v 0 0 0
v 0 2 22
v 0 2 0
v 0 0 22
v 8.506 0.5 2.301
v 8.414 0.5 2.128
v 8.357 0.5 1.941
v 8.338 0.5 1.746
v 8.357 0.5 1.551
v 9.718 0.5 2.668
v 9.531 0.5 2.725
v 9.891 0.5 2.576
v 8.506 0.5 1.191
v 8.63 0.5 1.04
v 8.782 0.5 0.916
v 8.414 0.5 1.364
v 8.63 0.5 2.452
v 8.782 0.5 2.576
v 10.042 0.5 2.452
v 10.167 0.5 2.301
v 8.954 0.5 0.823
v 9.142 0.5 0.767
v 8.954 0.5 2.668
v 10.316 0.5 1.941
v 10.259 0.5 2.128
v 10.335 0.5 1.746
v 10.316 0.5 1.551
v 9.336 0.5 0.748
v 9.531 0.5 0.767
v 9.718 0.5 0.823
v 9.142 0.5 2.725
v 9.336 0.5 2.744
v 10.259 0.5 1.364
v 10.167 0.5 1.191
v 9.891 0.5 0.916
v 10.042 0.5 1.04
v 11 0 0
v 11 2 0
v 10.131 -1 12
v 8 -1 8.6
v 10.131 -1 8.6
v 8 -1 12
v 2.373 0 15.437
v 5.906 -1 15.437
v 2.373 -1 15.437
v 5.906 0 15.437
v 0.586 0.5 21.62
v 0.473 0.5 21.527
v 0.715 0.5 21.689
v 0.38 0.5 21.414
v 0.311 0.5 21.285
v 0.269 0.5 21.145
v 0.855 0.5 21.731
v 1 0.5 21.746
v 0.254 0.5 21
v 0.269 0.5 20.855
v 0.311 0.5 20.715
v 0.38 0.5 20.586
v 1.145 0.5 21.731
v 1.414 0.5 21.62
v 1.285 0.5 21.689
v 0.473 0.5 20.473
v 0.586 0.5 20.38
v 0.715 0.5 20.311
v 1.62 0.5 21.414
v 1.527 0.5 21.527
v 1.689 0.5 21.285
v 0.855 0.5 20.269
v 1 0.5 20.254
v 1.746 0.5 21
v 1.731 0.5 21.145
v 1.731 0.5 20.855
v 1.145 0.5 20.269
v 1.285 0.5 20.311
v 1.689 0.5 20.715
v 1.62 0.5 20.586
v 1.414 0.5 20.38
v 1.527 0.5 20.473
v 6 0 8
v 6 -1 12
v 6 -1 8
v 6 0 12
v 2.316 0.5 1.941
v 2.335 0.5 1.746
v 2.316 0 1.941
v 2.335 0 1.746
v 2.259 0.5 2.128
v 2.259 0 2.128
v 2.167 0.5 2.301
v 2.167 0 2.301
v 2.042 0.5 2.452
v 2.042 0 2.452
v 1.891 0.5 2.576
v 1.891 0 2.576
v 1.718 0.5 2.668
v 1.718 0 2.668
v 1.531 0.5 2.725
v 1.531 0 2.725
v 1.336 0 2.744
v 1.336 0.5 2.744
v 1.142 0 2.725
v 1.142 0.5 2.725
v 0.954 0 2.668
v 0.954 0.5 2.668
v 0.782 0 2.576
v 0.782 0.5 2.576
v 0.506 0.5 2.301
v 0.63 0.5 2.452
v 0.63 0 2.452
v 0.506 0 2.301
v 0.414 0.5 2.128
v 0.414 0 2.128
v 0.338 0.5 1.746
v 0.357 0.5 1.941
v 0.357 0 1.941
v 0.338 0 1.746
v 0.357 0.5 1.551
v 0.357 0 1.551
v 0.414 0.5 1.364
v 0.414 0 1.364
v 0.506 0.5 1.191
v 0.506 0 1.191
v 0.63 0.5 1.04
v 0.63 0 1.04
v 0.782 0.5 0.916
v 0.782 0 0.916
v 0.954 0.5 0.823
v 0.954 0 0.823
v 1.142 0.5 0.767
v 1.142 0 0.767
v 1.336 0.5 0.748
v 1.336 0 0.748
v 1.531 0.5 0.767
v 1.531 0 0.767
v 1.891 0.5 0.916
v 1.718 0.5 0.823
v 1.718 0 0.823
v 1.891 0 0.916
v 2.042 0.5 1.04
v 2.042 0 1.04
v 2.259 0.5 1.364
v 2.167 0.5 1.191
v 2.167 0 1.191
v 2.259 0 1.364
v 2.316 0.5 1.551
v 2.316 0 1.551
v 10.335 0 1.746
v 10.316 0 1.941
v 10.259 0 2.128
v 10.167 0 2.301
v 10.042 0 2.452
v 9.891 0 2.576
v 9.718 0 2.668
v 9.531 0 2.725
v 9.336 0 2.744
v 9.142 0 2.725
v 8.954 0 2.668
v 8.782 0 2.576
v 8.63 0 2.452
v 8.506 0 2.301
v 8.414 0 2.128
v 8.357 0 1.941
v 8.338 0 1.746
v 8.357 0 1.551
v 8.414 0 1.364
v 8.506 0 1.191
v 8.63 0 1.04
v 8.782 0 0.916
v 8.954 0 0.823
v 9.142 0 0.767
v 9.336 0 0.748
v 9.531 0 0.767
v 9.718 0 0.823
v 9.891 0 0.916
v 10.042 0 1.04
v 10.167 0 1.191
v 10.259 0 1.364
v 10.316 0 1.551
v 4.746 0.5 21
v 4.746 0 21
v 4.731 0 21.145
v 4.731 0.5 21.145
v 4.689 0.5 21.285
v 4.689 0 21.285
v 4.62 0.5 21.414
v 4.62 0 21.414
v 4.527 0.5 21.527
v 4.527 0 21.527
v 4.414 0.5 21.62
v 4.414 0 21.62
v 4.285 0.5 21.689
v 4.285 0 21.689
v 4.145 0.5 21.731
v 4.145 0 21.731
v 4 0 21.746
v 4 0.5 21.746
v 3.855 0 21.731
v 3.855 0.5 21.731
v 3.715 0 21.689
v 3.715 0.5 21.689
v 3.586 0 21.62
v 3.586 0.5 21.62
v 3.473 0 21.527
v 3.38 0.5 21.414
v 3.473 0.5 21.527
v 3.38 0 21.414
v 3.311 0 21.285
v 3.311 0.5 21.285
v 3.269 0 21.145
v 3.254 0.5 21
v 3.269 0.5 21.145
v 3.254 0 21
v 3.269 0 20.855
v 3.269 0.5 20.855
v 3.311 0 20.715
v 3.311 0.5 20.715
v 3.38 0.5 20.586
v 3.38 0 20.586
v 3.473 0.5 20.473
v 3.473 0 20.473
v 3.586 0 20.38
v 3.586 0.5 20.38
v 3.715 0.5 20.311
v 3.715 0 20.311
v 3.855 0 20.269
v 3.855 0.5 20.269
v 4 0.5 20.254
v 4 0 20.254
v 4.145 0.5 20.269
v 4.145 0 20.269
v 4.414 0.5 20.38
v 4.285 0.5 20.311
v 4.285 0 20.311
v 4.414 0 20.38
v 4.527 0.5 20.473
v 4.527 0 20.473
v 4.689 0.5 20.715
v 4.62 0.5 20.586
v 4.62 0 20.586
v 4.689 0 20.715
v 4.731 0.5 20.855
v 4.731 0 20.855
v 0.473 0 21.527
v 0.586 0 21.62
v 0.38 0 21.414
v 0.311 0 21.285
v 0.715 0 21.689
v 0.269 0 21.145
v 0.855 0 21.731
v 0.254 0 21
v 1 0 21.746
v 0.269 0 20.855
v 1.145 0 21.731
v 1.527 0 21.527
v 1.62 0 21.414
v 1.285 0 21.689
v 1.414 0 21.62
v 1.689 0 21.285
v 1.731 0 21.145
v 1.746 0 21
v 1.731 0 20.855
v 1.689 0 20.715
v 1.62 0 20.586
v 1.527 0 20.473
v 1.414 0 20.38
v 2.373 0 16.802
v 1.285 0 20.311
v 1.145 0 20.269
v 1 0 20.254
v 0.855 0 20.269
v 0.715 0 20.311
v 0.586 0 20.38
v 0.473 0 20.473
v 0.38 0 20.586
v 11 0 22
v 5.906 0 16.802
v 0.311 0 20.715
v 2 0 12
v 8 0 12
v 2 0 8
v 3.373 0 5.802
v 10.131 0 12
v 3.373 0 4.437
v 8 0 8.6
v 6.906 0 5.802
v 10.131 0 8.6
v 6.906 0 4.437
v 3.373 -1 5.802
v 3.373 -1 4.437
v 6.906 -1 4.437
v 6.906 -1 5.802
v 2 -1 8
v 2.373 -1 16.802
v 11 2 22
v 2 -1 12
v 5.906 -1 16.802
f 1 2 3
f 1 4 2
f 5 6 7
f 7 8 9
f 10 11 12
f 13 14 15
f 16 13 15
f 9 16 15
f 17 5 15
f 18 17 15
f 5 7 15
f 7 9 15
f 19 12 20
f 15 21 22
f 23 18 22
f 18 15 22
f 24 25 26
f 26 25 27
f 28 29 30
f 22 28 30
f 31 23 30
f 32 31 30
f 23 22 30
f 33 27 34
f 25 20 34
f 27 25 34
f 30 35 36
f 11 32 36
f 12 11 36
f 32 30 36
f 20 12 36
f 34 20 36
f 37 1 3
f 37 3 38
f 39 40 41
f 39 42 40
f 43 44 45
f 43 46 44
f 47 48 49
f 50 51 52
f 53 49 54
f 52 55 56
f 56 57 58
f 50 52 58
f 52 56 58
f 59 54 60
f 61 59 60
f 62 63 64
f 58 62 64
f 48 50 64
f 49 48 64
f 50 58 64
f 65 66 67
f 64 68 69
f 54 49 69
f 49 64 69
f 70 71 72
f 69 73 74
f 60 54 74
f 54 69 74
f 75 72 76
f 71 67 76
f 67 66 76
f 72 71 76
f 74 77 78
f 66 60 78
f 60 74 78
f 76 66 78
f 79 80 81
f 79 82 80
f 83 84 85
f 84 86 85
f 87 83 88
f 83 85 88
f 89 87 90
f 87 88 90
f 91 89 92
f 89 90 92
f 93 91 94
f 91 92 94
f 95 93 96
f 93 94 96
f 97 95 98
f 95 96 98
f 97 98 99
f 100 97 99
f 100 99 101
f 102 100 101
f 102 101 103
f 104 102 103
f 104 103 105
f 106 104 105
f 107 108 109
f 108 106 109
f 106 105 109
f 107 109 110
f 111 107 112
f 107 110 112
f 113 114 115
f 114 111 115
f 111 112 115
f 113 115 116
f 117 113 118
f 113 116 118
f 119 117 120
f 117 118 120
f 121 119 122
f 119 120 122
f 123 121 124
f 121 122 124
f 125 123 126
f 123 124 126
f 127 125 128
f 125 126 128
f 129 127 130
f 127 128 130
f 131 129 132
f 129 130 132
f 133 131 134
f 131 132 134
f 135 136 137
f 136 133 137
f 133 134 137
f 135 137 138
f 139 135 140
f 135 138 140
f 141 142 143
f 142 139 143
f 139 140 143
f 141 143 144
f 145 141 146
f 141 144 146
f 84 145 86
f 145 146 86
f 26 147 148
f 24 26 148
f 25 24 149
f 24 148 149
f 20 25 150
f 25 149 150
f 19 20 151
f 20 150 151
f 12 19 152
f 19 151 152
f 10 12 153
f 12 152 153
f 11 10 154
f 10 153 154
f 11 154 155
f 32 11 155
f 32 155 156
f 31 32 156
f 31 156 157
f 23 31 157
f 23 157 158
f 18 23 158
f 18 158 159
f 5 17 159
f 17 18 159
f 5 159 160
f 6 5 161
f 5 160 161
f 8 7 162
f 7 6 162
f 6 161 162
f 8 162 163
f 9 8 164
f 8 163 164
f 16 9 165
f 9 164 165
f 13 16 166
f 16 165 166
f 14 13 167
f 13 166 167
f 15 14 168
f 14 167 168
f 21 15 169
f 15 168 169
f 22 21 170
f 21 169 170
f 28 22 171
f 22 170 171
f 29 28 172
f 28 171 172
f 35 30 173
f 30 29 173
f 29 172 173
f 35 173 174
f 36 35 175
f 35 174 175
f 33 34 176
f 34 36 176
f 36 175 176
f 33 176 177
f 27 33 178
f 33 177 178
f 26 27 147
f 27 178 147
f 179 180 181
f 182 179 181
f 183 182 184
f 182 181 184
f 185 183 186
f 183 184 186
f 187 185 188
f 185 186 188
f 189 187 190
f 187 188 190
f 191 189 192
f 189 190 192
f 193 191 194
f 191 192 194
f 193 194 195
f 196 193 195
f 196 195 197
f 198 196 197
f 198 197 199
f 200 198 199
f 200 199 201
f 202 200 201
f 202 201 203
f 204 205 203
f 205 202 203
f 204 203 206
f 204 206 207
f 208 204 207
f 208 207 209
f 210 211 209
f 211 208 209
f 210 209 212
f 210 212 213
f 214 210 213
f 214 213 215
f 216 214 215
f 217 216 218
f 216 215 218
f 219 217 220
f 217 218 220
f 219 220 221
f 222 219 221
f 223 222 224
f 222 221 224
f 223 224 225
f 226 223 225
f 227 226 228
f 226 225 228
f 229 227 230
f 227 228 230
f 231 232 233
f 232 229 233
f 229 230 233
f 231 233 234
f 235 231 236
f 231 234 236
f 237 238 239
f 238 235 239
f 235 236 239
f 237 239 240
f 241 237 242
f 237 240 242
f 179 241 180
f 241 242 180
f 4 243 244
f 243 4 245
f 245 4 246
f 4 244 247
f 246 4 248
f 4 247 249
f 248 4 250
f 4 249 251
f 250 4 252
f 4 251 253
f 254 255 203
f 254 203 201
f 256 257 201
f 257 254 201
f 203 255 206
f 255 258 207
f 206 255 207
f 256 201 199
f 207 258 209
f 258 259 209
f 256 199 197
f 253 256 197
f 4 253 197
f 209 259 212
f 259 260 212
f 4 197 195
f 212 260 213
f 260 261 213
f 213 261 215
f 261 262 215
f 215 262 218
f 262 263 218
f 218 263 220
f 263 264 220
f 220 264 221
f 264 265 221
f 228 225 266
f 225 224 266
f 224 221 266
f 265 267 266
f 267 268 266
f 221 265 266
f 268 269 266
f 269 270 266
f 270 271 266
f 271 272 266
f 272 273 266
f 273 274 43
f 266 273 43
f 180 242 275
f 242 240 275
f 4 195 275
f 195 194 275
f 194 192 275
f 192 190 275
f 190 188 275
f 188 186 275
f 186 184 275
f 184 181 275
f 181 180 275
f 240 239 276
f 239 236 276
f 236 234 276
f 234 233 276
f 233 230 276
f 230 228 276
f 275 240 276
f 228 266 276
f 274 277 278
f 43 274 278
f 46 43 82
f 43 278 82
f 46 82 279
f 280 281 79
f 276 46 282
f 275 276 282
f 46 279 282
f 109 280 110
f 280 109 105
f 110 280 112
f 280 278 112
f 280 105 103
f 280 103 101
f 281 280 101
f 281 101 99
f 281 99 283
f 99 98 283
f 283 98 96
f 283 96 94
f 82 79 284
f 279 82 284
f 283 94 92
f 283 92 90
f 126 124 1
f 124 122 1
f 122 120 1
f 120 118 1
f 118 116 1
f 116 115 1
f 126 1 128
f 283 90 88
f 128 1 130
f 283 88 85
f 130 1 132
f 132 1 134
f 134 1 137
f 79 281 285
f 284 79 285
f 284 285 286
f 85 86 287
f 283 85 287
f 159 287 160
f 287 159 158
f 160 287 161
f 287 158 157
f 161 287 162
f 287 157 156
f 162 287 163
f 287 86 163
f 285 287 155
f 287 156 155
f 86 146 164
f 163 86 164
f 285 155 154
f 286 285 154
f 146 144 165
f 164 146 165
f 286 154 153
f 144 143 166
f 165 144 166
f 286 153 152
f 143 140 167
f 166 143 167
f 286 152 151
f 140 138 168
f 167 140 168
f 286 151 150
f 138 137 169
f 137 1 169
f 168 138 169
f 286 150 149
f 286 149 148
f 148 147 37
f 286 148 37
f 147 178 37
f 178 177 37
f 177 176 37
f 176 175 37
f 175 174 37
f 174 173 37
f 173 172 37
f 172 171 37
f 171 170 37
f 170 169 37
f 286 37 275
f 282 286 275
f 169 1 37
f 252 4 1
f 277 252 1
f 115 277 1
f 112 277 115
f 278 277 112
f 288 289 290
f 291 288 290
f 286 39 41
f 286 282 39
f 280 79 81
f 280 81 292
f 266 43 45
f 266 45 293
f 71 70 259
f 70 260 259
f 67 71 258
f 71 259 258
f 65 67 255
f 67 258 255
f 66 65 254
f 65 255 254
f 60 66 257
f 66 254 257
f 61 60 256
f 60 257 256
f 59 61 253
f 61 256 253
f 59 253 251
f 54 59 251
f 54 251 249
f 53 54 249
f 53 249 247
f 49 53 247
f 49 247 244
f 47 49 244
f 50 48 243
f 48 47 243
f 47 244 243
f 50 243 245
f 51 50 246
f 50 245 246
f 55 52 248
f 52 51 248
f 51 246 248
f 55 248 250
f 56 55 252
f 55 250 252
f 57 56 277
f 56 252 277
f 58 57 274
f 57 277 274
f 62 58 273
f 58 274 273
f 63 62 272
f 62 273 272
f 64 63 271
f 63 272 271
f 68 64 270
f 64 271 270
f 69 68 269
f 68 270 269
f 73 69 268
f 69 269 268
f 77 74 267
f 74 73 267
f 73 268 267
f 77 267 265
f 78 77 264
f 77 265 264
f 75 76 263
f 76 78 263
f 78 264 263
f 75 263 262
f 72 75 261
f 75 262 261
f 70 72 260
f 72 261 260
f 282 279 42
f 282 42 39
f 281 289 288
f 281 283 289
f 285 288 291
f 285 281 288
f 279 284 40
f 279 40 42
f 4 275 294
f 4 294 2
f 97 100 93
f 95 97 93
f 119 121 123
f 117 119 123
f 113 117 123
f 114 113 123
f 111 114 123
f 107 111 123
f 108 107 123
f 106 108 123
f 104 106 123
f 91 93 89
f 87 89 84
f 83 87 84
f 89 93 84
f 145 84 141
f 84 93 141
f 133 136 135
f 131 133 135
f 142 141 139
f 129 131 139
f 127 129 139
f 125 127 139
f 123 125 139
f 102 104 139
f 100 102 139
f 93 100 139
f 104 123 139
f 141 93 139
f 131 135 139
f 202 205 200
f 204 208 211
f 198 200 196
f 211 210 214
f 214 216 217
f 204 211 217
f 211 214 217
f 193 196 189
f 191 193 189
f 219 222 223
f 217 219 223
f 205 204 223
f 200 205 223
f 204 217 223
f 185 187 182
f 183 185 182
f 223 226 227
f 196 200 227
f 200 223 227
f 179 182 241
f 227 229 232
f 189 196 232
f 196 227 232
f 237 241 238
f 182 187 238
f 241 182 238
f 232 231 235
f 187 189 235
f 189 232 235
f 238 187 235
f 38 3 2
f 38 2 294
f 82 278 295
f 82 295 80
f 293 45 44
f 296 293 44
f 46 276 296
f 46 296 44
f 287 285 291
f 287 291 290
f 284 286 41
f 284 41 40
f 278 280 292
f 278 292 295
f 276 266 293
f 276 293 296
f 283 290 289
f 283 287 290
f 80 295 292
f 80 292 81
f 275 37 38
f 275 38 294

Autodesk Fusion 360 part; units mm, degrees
sketch "Boceto1" plane through (0, 0, 0) normal (0, 1, 0) x (1, 0, 0)
  line L0 (0, 0) -> (11, 0)
  line L1 (11, 0) -> (11, -22)
  line L2 (11, -22) -> (0, -22)
  line L3 (0, -22) -> (0, 0)
  dimension "d1" = 11
  dimension "d2" = 22
extrude "Extruir1" add sketch "Boceto1" along normal blind 2
sketch "Boceto2" plane through (0, 0, 0) normal (0, -1, 0) x (1, 0, 0)
  line L0 (11, 22) -> (0, 22)
  line L1 (0, 22) -> (0, 0)
  line L2 (0, 0) -> (11, 0)
  line L3 (11, 0) -> (11, 22)
  line L4 (8, 12) -> (10.1306, 12)
  line L5 (10.1306, 12) -> (10.1306, 8.6002)
  line L6 (10.1306, 8.6002) -> (8, 8.6002)
  line L7 (8, 8.6002) -> (8, 12)
  line L8 (2, 12) -> (6, 12)
  line L9 (6, 12) -> (6, 8)
  line L10 (6, 8) -> (2, 8)
  line L11 (2, 8) -> (2, 12)
extrude "Extruir2" add sketch "Boceto2" along normal blind 1 contours L4 L5 L6 L7 | L8 L9 L10 L11
sketch "Boceto3" plane through (0, 0, 0) normal (0, 1, 0) x (1, 0, 0)
  circle A0 centre (1.3364, -1.7459) radius 0.9984
  circle A1 centre (9.3364, -1.7459) radius 0.9984
  circle A2 centre (1, -21) radius 0.7455
  circle A3 centre (4, -21) radius 0.7455
extrude "Extruir3" cut sketch "Boceto3" along normal blind 0.5
sketch "Boceto4" plane through (0, 0, 0) normal (0, 1, 0) x (1, 0, 0)
  line L0 (3.3729, -5.8021) -> (6.9064, -5.8021)
  line L1 (6.9064, -5.8021) -> (6.9064, -4.4369)
  line L2 (6.9064, -4.4369) -> (3.3729, -4.4369)
  line L3 (3.3729, -4.4369) -> (3.3729, -5.8021)
  line L4 (2.3729, -16.8021) -> (5.9064, -16.8021)
  line L5 (5.9064, -15.4369) -> (2.3729, -15.4369)
  line L6 (2.3729, -15.4369) -> (2.3729, -16.8021)
  line L7 (5.9064, -16.8021) -> (5.9064, -15.4369)
extrude "Extruir5" add sketch "Boceto4" against normal blind 1
